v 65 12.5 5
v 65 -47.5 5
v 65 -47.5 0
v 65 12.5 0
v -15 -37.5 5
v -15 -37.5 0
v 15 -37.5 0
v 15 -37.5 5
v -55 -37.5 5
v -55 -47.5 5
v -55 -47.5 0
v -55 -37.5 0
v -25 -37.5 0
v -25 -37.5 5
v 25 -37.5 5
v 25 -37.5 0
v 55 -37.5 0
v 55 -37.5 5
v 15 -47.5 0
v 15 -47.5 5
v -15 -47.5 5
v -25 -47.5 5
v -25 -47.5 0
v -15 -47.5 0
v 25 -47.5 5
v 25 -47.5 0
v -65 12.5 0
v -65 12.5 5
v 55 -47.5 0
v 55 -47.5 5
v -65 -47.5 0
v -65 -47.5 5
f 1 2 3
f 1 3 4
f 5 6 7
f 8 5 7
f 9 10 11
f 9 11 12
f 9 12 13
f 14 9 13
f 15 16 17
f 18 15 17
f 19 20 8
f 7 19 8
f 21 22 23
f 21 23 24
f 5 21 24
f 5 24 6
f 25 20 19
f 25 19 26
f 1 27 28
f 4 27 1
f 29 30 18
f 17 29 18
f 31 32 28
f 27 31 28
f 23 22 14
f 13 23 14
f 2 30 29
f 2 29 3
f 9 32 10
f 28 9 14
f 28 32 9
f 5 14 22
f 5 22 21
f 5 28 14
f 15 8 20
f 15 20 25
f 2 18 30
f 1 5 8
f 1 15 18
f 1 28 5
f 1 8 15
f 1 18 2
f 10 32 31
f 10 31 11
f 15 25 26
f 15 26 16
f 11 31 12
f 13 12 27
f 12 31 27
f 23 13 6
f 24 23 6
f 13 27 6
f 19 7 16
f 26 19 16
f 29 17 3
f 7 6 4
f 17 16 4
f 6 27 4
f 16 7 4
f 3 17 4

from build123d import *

# Parameters (mm, degrees)
ESQUISSE1_W                = 130
ESQUISSE1_H                = 50
BOSS_EXTRU_1_DEPTH         = 5
ESQUISSE2_W                = 10
ESQUISSE2_H                = 10
BOSS_EXTRU_2_DEPTH         = 5
R_P_TITION_LIN_AIRE1_COUNT = 4
R_P_TITION_LIN_AIRE1_PITCH = 40


with BuildPart() as part:
    # Esquisse1 → Boss.-Extru.1 (new body)
    with BuildSketch(Plane.XY):
        with Locations((0, -12.5)):
            Rectangle(ESQUISSE1_W, ESQUISSE1_H)
    extrude(amount=BOSS_EXTRU_1_DEPTH)

    # Esquisse2 → Boss.-Extru.2 (add)
    with BuildSketch(Plane.XY.offset(5)):
        with Locations((-60, -42.5)):
            Rectangle(ESQUISSE2_W, ESQUISSE2_H)
    boss_extru_2 = extrude(amount=-BOSS_EXTRU_2_DEPTH)

    # Répétition linéaire1: Boss.-Extru.2 ×4
    with Locations(*[(i * R_P_TITION_LIN_AIRE1_PITCH, 0, 0) for i in range(1, R_P_TITION_LIN_AIRE1_COUNT)]):
        add(boss_extru_2)


solid = part.part
